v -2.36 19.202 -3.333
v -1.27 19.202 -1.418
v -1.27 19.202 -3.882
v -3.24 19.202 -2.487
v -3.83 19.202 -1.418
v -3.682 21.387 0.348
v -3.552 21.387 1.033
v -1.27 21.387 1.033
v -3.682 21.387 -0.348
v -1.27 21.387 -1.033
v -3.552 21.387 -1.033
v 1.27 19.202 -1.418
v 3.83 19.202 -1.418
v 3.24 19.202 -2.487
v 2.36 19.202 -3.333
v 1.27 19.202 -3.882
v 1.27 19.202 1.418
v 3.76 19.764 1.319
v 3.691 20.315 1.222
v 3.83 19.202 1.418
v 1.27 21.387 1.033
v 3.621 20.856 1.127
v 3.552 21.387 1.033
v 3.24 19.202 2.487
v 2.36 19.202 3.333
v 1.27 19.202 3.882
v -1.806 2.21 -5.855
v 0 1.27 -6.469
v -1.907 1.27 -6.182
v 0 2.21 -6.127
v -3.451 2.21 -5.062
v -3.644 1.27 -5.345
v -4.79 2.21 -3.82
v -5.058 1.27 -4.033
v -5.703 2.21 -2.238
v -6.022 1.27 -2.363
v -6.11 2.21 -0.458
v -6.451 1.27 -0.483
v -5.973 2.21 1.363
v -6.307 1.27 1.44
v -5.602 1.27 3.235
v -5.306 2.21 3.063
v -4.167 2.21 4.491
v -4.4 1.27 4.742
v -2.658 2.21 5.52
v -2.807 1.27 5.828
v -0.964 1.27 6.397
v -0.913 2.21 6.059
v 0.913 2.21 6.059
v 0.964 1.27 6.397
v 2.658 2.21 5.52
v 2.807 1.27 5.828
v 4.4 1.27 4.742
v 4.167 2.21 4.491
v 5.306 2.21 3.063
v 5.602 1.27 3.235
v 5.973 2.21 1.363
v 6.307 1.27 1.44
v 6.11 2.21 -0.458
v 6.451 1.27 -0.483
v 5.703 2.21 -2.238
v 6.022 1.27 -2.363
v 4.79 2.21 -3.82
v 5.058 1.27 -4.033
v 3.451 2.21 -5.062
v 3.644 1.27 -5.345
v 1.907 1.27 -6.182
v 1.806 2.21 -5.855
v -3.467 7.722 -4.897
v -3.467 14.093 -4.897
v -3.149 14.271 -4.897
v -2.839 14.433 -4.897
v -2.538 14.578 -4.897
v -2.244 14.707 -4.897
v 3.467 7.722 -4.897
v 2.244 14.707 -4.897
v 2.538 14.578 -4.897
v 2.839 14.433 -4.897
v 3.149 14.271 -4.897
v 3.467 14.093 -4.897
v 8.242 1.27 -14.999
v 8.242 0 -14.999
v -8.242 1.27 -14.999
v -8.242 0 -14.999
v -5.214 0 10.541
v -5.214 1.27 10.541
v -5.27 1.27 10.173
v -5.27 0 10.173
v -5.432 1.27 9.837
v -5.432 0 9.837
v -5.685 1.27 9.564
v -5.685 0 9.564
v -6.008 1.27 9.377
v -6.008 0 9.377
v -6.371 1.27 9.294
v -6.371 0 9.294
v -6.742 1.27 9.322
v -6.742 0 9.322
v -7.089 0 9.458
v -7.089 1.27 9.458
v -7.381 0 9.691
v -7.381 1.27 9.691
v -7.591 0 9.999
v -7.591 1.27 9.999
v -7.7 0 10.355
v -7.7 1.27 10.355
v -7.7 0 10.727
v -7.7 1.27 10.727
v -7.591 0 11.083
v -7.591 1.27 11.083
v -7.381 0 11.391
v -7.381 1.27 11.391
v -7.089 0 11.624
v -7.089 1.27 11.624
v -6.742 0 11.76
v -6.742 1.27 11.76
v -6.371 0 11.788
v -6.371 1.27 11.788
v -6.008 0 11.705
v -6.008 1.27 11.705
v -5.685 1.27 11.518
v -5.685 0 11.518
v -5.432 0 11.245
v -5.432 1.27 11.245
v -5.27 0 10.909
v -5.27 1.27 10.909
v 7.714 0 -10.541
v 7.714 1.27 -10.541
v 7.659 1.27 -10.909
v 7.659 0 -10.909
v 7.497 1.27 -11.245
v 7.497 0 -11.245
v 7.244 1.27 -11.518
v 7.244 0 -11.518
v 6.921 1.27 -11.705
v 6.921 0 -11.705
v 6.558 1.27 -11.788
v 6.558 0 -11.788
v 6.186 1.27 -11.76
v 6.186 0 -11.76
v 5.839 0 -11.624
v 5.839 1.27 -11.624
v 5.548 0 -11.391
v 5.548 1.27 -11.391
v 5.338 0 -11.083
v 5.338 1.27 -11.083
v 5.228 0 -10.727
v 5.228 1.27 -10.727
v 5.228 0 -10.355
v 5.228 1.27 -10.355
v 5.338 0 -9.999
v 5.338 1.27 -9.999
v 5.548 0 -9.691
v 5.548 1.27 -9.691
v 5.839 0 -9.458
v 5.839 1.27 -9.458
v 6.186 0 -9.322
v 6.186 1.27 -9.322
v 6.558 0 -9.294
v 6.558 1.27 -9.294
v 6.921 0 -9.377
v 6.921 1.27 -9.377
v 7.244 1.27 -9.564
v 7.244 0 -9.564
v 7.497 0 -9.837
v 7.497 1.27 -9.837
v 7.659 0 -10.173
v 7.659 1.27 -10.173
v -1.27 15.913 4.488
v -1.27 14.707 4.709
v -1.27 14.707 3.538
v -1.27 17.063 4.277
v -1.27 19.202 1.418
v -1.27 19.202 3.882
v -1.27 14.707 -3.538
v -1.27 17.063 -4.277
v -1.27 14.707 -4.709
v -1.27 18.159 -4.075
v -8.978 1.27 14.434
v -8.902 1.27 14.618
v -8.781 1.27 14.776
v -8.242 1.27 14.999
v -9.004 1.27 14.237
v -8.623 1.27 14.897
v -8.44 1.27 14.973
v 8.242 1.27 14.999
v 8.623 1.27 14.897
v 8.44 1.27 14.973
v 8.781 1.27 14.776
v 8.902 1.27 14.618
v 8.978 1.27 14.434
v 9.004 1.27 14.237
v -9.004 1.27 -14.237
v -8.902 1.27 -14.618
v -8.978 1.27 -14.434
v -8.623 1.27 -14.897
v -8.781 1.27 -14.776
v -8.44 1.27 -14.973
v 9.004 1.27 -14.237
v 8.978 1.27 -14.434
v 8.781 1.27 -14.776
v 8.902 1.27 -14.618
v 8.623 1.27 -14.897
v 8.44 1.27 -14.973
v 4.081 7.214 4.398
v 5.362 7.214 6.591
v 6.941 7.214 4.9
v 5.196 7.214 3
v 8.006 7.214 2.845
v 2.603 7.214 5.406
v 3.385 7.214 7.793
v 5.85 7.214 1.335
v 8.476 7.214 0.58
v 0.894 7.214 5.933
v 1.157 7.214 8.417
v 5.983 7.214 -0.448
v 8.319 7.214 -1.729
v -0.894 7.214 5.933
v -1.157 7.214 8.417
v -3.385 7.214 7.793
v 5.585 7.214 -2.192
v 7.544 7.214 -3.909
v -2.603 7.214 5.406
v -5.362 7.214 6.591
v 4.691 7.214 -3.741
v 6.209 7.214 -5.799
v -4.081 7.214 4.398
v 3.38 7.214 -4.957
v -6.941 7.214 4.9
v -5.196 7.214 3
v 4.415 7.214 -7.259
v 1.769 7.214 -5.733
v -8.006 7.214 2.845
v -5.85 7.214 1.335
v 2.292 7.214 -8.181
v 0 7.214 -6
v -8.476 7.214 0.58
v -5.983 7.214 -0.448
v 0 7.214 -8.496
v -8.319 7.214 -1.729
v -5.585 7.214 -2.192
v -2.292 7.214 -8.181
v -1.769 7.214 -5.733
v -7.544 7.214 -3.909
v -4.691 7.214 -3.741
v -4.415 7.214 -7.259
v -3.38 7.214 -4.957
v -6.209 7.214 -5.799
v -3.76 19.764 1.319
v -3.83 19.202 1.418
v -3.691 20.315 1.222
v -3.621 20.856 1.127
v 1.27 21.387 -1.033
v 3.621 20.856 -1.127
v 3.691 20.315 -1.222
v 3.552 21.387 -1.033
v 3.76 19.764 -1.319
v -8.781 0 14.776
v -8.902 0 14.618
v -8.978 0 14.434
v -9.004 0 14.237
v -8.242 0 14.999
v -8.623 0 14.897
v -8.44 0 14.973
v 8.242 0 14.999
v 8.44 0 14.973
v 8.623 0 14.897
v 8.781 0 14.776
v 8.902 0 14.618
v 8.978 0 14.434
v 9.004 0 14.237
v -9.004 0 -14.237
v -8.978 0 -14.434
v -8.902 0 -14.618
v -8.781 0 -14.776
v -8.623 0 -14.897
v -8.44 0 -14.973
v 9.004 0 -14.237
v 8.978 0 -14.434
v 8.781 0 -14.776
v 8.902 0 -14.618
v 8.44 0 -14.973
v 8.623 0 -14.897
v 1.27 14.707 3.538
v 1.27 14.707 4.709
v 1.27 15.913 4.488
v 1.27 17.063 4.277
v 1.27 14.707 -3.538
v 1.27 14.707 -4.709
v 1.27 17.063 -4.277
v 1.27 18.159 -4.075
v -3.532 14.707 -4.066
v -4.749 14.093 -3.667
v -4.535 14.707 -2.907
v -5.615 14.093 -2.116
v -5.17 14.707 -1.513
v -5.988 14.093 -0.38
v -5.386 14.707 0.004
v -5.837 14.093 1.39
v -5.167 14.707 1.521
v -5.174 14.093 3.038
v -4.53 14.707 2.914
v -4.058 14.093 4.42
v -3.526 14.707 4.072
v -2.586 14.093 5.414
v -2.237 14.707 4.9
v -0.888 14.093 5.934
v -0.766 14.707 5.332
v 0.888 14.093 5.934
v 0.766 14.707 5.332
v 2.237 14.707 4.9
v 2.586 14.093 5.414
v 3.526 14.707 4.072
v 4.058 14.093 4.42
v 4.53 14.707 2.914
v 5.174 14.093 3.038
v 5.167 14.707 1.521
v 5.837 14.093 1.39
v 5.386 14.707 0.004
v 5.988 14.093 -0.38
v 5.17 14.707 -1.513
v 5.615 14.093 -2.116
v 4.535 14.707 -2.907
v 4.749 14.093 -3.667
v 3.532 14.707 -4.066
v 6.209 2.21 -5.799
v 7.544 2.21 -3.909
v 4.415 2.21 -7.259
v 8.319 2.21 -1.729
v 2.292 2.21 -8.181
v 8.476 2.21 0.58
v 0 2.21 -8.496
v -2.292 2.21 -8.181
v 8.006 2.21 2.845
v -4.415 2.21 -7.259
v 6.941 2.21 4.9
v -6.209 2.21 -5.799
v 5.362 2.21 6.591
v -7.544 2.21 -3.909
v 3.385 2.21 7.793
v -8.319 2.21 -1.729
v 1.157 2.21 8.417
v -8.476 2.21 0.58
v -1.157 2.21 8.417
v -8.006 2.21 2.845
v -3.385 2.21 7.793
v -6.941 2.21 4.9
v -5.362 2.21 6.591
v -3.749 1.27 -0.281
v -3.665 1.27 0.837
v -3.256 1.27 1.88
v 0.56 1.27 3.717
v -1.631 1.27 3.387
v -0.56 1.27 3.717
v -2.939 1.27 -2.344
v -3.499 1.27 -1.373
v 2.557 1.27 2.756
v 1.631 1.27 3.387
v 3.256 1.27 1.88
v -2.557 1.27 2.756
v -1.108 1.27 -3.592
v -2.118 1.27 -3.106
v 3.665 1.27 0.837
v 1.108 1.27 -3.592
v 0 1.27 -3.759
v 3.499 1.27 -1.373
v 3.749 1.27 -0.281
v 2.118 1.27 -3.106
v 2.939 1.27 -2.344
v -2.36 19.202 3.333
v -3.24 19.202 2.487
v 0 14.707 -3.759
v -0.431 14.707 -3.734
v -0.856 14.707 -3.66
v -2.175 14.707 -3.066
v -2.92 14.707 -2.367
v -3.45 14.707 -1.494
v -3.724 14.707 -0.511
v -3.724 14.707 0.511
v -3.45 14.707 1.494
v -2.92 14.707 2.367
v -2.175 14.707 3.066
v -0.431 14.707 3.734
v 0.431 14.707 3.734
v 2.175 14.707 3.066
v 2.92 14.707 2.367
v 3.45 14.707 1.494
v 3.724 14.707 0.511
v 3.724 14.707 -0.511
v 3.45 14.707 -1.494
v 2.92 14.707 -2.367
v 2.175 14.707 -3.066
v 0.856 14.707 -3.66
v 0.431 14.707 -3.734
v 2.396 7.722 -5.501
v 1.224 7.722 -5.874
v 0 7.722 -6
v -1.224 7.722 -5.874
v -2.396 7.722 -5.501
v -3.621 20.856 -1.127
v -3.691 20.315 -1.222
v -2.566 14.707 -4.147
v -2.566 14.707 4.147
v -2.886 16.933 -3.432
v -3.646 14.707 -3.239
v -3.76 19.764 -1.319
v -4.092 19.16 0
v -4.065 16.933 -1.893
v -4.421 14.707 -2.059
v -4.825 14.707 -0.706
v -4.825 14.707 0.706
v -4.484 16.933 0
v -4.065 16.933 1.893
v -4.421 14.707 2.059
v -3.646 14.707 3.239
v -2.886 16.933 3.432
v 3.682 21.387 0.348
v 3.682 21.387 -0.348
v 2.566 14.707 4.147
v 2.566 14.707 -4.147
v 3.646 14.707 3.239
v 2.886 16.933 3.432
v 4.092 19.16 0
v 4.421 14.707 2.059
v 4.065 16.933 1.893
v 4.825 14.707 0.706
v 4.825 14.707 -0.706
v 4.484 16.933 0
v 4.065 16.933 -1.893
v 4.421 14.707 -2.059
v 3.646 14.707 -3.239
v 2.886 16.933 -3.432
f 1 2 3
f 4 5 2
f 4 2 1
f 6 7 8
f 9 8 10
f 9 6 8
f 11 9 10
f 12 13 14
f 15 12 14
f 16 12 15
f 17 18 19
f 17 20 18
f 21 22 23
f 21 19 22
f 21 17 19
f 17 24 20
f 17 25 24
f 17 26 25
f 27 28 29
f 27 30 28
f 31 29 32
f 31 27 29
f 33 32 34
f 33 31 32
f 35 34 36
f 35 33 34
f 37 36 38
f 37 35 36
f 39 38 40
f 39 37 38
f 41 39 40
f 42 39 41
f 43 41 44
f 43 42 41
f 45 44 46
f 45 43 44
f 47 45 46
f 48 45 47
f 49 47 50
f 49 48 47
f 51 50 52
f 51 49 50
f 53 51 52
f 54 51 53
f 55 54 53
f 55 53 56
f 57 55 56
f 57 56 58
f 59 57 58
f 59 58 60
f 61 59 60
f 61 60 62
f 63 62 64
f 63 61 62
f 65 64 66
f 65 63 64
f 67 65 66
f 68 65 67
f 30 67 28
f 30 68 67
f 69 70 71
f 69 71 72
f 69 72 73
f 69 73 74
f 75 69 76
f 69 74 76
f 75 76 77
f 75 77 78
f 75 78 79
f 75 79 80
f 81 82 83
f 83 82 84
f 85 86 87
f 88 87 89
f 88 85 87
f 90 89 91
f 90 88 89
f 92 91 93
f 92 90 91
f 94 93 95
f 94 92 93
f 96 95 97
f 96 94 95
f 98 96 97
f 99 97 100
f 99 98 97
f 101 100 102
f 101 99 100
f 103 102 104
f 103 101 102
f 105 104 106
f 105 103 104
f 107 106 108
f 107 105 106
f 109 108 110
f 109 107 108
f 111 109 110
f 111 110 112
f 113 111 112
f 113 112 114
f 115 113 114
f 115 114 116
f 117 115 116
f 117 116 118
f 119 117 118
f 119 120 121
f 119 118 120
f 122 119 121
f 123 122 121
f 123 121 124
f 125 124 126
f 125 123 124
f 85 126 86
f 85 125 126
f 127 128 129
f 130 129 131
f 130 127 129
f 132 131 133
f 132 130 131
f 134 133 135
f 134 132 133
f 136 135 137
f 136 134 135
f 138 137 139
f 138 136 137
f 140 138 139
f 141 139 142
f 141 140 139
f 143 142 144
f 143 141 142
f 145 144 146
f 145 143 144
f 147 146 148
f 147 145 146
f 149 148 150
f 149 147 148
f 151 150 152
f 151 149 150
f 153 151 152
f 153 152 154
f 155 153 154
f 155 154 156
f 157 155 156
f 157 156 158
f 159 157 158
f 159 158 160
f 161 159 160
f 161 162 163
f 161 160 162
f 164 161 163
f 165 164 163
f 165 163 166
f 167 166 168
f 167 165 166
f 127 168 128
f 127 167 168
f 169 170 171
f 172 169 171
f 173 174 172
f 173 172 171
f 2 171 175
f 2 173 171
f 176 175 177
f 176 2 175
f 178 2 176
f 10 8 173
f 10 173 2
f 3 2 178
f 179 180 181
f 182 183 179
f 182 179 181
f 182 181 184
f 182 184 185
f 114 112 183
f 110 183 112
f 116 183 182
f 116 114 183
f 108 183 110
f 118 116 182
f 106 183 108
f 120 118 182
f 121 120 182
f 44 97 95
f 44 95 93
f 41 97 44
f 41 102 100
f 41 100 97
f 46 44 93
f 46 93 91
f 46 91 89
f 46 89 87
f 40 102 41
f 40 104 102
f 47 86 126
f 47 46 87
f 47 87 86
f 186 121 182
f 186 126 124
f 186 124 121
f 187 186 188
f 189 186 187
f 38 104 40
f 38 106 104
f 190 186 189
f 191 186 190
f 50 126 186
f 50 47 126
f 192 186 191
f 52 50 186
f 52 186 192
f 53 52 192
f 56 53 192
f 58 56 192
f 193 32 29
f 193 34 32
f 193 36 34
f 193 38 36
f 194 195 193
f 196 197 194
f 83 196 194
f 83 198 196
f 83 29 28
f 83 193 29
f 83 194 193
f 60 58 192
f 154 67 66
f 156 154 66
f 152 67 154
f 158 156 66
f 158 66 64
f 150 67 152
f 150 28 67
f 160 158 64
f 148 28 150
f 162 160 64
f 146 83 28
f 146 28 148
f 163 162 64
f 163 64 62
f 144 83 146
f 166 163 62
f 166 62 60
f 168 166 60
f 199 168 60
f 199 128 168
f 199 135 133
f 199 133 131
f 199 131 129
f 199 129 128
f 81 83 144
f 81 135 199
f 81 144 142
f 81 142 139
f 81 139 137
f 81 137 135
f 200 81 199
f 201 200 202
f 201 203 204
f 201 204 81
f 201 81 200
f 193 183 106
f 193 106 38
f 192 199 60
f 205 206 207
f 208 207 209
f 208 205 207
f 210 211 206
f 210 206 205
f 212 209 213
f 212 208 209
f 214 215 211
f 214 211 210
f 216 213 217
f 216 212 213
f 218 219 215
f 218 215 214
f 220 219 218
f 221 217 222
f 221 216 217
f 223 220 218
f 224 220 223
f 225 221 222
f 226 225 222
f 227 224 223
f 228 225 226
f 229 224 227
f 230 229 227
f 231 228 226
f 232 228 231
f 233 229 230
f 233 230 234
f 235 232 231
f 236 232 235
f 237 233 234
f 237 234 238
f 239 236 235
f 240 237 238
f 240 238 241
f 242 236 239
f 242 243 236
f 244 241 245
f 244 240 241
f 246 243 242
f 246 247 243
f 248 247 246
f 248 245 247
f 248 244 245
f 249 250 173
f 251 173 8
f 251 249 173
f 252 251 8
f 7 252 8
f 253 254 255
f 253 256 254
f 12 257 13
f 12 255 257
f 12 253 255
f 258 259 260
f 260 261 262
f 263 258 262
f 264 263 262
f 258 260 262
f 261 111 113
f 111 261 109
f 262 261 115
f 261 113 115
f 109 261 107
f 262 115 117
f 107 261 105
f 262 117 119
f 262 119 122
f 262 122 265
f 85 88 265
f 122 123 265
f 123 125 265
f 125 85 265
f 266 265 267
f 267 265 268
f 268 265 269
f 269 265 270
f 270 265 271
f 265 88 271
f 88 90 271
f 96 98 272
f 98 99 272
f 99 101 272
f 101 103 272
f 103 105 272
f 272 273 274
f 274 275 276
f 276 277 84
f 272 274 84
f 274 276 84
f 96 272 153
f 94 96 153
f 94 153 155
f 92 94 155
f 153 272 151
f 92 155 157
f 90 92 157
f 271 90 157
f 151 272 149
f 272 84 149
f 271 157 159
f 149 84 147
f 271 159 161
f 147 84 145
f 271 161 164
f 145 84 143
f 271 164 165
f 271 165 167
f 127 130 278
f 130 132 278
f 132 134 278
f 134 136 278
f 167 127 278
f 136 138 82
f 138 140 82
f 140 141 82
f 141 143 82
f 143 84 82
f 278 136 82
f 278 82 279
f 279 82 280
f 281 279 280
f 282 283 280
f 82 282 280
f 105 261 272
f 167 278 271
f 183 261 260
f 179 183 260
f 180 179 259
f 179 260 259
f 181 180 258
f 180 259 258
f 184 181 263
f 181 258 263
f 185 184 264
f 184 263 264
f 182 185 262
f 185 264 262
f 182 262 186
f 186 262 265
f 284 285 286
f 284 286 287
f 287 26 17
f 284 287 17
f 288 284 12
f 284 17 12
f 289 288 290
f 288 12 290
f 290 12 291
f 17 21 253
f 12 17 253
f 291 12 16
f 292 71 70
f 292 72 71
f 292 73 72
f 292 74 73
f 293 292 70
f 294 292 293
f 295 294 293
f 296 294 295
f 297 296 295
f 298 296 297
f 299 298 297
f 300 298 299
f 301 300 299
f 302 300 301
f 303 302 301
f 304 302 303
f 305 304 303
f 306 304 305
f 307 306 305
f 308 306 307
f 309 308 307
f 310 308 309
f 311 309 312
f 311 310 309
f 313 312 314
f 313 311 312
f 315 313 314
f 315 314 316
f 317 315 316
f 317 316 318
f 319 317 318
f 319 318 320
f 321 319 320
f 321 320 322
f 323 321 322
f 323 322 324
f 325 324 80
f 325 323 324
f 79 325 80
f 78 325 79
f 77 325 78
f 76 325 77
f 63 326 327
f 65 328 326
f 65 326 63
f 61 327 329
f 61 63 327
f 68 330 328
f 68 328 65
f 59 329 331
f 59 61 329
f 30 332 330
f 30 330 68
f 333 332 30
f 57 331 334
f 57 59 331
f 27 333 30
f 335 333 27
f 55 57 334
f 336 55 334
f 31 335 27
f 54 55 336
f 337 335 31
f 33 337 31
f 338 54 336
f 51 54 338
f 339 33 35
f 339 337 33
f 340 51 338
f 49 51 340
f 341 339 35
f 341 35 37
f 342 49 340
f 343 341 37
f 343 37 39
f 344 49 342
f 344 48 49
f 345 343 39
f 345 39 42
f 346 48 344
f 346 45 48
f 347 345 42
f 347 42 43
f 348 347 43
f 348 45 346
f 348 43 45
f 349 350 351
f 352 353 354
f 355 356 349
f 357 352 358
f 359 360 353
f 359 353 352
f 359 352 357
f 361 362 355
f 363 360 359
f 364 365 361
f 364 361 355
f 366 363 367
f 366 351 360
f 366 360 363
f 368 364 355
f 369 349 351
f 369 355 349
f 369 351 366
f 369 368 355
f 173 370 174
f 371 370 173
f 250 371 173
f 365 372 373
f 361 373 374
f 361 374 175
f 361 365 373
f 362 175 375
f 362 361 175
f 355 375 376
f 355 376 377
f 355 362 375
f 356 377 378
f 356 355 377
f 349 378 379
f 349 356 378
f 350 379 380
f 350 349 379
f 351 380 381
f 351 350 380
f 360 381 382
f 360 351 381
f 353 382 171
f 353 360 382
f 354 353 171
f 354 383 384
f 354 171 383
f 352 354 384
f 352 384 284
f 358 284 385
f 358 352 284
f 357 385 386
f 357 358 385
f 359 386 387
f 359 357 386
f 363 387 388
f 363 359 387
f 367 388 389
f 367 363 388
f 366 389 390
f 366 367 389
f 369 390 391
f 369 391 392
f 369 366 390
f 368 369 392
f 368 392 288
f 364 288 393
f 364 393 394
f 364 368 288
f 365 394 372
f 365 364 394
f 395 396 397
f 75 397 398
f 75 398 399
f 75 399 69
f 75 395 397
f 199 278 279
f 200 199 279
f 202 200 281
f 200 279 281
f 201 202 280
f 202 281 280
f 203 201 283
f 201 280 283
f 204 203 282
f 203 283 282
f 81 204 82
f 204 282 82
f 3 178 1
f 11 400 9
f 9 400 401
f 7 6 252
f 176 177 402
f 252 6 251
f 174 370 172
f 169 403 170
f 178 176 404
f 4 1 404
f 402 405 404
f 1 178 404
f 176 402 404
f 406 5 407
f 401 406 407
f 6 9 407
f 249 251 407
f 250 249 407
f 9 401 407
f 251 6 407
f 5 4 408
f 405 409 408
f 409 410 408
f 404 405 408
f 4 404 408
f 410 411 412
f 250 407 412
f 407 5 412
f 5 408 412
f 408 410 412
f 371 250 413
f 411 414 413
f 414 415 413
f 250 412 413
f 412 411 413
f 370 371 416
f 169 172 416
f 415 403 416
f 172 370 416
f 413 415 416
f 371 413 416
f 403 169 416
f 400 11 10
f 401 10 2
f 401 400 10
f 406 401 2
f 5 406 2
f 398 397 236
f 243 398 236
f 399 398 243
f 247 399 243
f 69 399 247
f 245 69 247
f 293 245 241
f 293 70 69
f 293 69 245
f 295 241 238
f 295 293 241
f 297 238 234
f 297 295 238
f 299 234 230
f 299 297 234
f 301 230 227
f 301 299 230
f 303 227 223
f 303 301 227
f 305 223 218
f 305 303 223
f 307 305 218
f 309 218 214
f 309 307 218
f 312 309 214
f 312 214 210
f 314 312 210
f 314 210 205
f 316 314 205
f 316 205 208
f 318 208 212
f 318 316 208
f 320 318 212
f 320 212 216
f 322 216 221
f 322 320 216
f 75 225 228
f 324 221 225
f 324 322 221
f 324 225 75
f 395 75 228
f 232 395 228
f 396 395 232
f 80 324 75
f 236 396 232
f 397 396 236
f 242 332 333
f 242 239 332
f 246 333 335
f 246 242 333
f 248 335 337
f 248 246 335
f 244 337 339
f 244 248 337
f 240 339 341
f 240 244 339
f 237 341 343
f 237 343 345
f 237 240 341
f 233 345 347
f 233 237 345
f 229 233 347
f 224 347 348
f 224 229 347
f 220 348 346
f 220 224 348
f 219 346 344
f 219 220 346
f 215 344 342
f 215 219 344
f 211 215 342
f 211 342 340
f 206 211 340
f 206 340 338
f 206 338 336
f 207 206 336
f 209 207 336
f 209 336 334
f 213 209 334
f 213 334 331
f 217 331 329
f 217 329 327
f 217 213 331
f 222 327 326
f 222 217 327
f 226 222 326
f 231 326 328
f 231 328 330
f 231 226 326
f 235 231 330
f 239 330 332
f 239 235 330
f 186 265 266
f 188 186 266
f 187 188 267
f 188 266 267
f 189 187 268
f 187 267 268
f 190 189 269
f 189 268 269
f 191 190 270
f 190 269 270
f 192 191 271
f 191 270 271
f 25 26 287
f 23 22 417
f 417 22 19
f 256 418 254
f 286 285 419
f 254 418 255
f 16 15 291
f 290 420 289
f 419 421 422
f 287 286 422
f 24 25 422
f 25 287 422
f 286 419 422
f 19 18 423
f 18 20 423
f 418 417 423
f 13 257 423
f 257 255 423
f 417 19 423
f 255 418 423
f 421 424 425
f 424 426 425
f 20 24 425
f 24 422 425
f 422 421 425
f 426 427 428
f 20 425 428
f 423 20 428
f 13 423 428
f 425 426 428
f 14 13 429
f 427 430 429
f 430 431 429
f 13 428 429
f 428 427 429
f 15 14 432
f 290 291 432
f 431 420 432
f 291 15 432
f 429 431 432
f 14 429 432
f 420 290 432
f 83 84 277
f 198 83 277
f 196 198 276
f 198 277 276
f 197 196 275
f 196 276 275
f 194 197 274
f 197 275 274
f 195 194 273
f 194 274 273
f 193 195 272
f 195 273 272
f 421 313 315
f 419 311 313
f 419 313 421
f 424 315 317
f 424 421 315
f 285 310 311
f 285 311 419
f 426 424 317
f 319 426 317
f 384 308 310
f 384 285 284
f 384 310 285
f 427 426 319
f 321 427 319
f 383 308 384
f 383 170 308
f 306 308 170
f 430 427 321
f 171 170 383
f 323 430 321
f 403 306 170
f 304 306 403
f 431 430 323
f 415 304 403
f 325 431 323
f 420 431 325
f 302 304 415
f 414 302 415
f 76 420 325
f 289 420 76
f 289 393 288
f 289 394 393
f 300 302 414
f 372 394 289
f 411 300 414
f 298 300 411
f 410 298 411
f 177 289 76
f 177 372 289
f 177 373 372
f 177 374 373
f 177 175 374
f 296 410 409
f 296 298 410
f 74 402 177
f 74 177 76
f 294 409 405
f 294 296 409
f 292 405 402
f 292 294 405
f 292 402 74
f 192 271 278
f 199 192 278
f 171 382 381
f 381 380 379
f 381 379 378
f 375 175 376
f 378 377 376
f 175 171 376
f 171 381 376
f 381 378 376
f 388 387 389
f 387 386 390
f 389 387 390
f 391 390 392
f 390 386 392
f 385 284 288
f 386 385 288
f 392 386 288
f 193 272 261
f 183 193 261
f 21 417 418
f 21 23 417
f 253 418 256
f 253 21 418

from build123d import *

# Parameters (mm, degrees)
BOSS_EXTRUDE1_DEPTH     = 1.27
CUT_EXTRUDE1_DEPTH      = 6.985
CUT_EXTRUDE1_DEPTH_BACK = 6.985
SKETCH3_W               = 12
SKETCH3_H               = 12
CUT_EXTRUDE2_DEPTH      = 12
CUT_EXTRUDE2_DEPTH_BACK = 12
CUT_EXTRUDE3_DEPTH      = 1.27
CUT_EXTRUDE3_DEPTH_BACK = 1.27
SKETCH6_W               = 9.7536
SKETCH6_H               = 7.3914
CUT_EXTRUDE4_DEPTH      = 2.54
CUT_EXTRUDE4_DEPTH_BACK = 2.54
SKETCH7_R               = 1.25
CUT_EXTRUDE5_DEPTH      = 2.54
CUT_EXTRUDE5_DEPTH_BACK = 2.54
SKETCH8_R               = 1.25


with BuildPart() as part:
    # Sketch1 → Boss-Extrude1 (new body)
    with BuildSketch(Plane(origin=(0, 0, 0), x_dir=(1, 0, 0), z_dir=(0, 1, 0))):
        with BuildLine():
            Line((-9.0043, 14.2367), (-9.0043, -14.2367))
            ThreePointArc((-9.0043, -14.2367), (-8.781115367, -14.775515367), (-8.2423, -14.9987))
            Line((-8.2423, -14.9987), (8.2423, -14.9987))
            ThreePointArc((8.2423, -14.9987), (8.781115367, -14.775515367), (9.0043, -14.2367))
            Line((9.0043, -14.2367), (9.0043, 14.2367))
            ThreePointArc((9.0043, 14.2367), (8.781115367, 14.775515367), (8.2423, 14.9987))
            Line((8.2423, 14.9987), (-8.2423, 14.9987))
            ThreePointArc((-8.2423, 14.9987), (-8.781115367, 14.775515367), (-9.0043, 14.2367))
        make_face()
    extrude(amount=BOSS_EXTRUDE1_DEPTH)

    # Sketch2 → Revolve1 (revolve)
    with BuildSketch(Plane(origin=(0, 0, 0), x_dir=(0, 0, -1), z_dir=(1, 0, 0))):
        Polygon((3.7592, 14.7066), (3.7592, 0.9398), (6.589242136, 0.9398), (6.126999938, 2.2098), (8.4963, 2.2098), (8.4963, 7.2136), (5.999999938, 7.2136), (5.999999938, 14.093100062), (5.3865, 14.7066), align=None)
    revolve(axis=Axis((0, 0.9398, 0), (0, 1, 0)))

    # Sketch3 → Cut-Extrude1 (cut, two sides: drawn at the far end of the back side and taken through both)
    with BuildSketch(Plane(origin=(0, 14.7066, 0), x_dir=(1, 0, 0), z_dir=(0, 1, 0)).offset(-CUT_EXTRUDE1_DEPTH_BACK)):
        with Locations((0, 10.8966)):
            Rectangle(SKETCH3_W, SKETCH3_H)
    extrude(amount=CUT_EXTRUDE1_DEPTH + CUT_EXTRUDE1_DEPTH_BACK, mode=Mode.SUBTRACT)

    # Sketch4 → Revolve2 (revolve)
    with BuildSketch(Plane(origin=(0, 0, 0), x_dir=(0, 0, -1), z_dir=(1, 0, 0))):
        Polygon((0, 22.098), (3.573496755, 22.098), (4.8768, 14.7066), (0, 14.7066), align=None)
    revolve(axis=Axis((0, 14.7066, 0), (0, 1, 0)))

    # Sketch5 → Cut-Extrude2 (cut, two sides: drawn at the far end of the back side and taken through both)
    with BuildSketch(Plane(origin=(0, 0, 0), x_dir=(0, 0, -1), z_dir=(1, 0, 0)).offset(-CUT_EXTRUDE2_DEPTH_BACK)):
        Polygon((-4.8768, 23.6982), (-4.08406916, 19.2024), (-1.418134328, 19.2024), (-1.032965672, 21.3868), (1.032965672, 21.3868), (1.418134328, 19.2024), (4.08406916, 19.2024), (4.8768, 23.6982), align=None)
    extrude(amount=CUT_EXTRUDE2_DEPTH + CUT_EXTRUDE2_DEPTH_BACK, mode=Mode.SUBTRACT)

    # Sketch6 → Cut-Extrude3 (cut, two sides: drawn at the far end of the back side and taken through both)
    with BuildSketch(Plane(origin=(0, 0, 0), x_dir=(0, 0, -1), z_dir=(1, 0, 0)).offset(-CUT_EXTRUDE3_DEPTH_BACK)):
        with Locations((0, 18.4023)):
            Rectangle(SKETCH6_W, SKETCH6_H)
    extrude(amount=CUT_EXTRUDE3_DEPTH + CUT_EXTRUDE3_DEPTH_BACK, mode=Mode.SUBTRACT)

    # Sketch7 → Cut-Extrude4 (cut, two sides: drawn at the far end of the back side and taken through both)
    with BuildSketch(Plane(origin=(0, 0, 0), x_dir=(1, 0, 0), z_dir=(0, 1, 0)).offset(-CUT_EXTRUDE4_DEPTH_BACK)):
        with Locations((6.4643, 10.541)):
            Circle(SKETCH7_R)
    extrude(amount=CUT_EXTRUDE4_DEPTH + CUT_EXTRUDE4_DEPTH_BACK, mode=Mode.SUBTRACT)

    # Sketch8 → Cut-Extrude5 (cut, two sides: drawn at the far end of the back side and taken through both)
    with BuildSketch(Plane(origin=(0, 0, 0), x_dir=(1, 0, 0), z_dir=(0, 1, 0)).offset(-CUT_EXTRUDE5_DEPTH_BACK)):
        with Locations((-6.4643, -10.541)):
            Circle(SKETCH8_R)
    extrude(amount=CUT_EXTRUDE5_DEPTH + CUT_EXTRUDE5_DEPTH_BACK, mode=Mode.SUBTRACT)


solid = part.part
